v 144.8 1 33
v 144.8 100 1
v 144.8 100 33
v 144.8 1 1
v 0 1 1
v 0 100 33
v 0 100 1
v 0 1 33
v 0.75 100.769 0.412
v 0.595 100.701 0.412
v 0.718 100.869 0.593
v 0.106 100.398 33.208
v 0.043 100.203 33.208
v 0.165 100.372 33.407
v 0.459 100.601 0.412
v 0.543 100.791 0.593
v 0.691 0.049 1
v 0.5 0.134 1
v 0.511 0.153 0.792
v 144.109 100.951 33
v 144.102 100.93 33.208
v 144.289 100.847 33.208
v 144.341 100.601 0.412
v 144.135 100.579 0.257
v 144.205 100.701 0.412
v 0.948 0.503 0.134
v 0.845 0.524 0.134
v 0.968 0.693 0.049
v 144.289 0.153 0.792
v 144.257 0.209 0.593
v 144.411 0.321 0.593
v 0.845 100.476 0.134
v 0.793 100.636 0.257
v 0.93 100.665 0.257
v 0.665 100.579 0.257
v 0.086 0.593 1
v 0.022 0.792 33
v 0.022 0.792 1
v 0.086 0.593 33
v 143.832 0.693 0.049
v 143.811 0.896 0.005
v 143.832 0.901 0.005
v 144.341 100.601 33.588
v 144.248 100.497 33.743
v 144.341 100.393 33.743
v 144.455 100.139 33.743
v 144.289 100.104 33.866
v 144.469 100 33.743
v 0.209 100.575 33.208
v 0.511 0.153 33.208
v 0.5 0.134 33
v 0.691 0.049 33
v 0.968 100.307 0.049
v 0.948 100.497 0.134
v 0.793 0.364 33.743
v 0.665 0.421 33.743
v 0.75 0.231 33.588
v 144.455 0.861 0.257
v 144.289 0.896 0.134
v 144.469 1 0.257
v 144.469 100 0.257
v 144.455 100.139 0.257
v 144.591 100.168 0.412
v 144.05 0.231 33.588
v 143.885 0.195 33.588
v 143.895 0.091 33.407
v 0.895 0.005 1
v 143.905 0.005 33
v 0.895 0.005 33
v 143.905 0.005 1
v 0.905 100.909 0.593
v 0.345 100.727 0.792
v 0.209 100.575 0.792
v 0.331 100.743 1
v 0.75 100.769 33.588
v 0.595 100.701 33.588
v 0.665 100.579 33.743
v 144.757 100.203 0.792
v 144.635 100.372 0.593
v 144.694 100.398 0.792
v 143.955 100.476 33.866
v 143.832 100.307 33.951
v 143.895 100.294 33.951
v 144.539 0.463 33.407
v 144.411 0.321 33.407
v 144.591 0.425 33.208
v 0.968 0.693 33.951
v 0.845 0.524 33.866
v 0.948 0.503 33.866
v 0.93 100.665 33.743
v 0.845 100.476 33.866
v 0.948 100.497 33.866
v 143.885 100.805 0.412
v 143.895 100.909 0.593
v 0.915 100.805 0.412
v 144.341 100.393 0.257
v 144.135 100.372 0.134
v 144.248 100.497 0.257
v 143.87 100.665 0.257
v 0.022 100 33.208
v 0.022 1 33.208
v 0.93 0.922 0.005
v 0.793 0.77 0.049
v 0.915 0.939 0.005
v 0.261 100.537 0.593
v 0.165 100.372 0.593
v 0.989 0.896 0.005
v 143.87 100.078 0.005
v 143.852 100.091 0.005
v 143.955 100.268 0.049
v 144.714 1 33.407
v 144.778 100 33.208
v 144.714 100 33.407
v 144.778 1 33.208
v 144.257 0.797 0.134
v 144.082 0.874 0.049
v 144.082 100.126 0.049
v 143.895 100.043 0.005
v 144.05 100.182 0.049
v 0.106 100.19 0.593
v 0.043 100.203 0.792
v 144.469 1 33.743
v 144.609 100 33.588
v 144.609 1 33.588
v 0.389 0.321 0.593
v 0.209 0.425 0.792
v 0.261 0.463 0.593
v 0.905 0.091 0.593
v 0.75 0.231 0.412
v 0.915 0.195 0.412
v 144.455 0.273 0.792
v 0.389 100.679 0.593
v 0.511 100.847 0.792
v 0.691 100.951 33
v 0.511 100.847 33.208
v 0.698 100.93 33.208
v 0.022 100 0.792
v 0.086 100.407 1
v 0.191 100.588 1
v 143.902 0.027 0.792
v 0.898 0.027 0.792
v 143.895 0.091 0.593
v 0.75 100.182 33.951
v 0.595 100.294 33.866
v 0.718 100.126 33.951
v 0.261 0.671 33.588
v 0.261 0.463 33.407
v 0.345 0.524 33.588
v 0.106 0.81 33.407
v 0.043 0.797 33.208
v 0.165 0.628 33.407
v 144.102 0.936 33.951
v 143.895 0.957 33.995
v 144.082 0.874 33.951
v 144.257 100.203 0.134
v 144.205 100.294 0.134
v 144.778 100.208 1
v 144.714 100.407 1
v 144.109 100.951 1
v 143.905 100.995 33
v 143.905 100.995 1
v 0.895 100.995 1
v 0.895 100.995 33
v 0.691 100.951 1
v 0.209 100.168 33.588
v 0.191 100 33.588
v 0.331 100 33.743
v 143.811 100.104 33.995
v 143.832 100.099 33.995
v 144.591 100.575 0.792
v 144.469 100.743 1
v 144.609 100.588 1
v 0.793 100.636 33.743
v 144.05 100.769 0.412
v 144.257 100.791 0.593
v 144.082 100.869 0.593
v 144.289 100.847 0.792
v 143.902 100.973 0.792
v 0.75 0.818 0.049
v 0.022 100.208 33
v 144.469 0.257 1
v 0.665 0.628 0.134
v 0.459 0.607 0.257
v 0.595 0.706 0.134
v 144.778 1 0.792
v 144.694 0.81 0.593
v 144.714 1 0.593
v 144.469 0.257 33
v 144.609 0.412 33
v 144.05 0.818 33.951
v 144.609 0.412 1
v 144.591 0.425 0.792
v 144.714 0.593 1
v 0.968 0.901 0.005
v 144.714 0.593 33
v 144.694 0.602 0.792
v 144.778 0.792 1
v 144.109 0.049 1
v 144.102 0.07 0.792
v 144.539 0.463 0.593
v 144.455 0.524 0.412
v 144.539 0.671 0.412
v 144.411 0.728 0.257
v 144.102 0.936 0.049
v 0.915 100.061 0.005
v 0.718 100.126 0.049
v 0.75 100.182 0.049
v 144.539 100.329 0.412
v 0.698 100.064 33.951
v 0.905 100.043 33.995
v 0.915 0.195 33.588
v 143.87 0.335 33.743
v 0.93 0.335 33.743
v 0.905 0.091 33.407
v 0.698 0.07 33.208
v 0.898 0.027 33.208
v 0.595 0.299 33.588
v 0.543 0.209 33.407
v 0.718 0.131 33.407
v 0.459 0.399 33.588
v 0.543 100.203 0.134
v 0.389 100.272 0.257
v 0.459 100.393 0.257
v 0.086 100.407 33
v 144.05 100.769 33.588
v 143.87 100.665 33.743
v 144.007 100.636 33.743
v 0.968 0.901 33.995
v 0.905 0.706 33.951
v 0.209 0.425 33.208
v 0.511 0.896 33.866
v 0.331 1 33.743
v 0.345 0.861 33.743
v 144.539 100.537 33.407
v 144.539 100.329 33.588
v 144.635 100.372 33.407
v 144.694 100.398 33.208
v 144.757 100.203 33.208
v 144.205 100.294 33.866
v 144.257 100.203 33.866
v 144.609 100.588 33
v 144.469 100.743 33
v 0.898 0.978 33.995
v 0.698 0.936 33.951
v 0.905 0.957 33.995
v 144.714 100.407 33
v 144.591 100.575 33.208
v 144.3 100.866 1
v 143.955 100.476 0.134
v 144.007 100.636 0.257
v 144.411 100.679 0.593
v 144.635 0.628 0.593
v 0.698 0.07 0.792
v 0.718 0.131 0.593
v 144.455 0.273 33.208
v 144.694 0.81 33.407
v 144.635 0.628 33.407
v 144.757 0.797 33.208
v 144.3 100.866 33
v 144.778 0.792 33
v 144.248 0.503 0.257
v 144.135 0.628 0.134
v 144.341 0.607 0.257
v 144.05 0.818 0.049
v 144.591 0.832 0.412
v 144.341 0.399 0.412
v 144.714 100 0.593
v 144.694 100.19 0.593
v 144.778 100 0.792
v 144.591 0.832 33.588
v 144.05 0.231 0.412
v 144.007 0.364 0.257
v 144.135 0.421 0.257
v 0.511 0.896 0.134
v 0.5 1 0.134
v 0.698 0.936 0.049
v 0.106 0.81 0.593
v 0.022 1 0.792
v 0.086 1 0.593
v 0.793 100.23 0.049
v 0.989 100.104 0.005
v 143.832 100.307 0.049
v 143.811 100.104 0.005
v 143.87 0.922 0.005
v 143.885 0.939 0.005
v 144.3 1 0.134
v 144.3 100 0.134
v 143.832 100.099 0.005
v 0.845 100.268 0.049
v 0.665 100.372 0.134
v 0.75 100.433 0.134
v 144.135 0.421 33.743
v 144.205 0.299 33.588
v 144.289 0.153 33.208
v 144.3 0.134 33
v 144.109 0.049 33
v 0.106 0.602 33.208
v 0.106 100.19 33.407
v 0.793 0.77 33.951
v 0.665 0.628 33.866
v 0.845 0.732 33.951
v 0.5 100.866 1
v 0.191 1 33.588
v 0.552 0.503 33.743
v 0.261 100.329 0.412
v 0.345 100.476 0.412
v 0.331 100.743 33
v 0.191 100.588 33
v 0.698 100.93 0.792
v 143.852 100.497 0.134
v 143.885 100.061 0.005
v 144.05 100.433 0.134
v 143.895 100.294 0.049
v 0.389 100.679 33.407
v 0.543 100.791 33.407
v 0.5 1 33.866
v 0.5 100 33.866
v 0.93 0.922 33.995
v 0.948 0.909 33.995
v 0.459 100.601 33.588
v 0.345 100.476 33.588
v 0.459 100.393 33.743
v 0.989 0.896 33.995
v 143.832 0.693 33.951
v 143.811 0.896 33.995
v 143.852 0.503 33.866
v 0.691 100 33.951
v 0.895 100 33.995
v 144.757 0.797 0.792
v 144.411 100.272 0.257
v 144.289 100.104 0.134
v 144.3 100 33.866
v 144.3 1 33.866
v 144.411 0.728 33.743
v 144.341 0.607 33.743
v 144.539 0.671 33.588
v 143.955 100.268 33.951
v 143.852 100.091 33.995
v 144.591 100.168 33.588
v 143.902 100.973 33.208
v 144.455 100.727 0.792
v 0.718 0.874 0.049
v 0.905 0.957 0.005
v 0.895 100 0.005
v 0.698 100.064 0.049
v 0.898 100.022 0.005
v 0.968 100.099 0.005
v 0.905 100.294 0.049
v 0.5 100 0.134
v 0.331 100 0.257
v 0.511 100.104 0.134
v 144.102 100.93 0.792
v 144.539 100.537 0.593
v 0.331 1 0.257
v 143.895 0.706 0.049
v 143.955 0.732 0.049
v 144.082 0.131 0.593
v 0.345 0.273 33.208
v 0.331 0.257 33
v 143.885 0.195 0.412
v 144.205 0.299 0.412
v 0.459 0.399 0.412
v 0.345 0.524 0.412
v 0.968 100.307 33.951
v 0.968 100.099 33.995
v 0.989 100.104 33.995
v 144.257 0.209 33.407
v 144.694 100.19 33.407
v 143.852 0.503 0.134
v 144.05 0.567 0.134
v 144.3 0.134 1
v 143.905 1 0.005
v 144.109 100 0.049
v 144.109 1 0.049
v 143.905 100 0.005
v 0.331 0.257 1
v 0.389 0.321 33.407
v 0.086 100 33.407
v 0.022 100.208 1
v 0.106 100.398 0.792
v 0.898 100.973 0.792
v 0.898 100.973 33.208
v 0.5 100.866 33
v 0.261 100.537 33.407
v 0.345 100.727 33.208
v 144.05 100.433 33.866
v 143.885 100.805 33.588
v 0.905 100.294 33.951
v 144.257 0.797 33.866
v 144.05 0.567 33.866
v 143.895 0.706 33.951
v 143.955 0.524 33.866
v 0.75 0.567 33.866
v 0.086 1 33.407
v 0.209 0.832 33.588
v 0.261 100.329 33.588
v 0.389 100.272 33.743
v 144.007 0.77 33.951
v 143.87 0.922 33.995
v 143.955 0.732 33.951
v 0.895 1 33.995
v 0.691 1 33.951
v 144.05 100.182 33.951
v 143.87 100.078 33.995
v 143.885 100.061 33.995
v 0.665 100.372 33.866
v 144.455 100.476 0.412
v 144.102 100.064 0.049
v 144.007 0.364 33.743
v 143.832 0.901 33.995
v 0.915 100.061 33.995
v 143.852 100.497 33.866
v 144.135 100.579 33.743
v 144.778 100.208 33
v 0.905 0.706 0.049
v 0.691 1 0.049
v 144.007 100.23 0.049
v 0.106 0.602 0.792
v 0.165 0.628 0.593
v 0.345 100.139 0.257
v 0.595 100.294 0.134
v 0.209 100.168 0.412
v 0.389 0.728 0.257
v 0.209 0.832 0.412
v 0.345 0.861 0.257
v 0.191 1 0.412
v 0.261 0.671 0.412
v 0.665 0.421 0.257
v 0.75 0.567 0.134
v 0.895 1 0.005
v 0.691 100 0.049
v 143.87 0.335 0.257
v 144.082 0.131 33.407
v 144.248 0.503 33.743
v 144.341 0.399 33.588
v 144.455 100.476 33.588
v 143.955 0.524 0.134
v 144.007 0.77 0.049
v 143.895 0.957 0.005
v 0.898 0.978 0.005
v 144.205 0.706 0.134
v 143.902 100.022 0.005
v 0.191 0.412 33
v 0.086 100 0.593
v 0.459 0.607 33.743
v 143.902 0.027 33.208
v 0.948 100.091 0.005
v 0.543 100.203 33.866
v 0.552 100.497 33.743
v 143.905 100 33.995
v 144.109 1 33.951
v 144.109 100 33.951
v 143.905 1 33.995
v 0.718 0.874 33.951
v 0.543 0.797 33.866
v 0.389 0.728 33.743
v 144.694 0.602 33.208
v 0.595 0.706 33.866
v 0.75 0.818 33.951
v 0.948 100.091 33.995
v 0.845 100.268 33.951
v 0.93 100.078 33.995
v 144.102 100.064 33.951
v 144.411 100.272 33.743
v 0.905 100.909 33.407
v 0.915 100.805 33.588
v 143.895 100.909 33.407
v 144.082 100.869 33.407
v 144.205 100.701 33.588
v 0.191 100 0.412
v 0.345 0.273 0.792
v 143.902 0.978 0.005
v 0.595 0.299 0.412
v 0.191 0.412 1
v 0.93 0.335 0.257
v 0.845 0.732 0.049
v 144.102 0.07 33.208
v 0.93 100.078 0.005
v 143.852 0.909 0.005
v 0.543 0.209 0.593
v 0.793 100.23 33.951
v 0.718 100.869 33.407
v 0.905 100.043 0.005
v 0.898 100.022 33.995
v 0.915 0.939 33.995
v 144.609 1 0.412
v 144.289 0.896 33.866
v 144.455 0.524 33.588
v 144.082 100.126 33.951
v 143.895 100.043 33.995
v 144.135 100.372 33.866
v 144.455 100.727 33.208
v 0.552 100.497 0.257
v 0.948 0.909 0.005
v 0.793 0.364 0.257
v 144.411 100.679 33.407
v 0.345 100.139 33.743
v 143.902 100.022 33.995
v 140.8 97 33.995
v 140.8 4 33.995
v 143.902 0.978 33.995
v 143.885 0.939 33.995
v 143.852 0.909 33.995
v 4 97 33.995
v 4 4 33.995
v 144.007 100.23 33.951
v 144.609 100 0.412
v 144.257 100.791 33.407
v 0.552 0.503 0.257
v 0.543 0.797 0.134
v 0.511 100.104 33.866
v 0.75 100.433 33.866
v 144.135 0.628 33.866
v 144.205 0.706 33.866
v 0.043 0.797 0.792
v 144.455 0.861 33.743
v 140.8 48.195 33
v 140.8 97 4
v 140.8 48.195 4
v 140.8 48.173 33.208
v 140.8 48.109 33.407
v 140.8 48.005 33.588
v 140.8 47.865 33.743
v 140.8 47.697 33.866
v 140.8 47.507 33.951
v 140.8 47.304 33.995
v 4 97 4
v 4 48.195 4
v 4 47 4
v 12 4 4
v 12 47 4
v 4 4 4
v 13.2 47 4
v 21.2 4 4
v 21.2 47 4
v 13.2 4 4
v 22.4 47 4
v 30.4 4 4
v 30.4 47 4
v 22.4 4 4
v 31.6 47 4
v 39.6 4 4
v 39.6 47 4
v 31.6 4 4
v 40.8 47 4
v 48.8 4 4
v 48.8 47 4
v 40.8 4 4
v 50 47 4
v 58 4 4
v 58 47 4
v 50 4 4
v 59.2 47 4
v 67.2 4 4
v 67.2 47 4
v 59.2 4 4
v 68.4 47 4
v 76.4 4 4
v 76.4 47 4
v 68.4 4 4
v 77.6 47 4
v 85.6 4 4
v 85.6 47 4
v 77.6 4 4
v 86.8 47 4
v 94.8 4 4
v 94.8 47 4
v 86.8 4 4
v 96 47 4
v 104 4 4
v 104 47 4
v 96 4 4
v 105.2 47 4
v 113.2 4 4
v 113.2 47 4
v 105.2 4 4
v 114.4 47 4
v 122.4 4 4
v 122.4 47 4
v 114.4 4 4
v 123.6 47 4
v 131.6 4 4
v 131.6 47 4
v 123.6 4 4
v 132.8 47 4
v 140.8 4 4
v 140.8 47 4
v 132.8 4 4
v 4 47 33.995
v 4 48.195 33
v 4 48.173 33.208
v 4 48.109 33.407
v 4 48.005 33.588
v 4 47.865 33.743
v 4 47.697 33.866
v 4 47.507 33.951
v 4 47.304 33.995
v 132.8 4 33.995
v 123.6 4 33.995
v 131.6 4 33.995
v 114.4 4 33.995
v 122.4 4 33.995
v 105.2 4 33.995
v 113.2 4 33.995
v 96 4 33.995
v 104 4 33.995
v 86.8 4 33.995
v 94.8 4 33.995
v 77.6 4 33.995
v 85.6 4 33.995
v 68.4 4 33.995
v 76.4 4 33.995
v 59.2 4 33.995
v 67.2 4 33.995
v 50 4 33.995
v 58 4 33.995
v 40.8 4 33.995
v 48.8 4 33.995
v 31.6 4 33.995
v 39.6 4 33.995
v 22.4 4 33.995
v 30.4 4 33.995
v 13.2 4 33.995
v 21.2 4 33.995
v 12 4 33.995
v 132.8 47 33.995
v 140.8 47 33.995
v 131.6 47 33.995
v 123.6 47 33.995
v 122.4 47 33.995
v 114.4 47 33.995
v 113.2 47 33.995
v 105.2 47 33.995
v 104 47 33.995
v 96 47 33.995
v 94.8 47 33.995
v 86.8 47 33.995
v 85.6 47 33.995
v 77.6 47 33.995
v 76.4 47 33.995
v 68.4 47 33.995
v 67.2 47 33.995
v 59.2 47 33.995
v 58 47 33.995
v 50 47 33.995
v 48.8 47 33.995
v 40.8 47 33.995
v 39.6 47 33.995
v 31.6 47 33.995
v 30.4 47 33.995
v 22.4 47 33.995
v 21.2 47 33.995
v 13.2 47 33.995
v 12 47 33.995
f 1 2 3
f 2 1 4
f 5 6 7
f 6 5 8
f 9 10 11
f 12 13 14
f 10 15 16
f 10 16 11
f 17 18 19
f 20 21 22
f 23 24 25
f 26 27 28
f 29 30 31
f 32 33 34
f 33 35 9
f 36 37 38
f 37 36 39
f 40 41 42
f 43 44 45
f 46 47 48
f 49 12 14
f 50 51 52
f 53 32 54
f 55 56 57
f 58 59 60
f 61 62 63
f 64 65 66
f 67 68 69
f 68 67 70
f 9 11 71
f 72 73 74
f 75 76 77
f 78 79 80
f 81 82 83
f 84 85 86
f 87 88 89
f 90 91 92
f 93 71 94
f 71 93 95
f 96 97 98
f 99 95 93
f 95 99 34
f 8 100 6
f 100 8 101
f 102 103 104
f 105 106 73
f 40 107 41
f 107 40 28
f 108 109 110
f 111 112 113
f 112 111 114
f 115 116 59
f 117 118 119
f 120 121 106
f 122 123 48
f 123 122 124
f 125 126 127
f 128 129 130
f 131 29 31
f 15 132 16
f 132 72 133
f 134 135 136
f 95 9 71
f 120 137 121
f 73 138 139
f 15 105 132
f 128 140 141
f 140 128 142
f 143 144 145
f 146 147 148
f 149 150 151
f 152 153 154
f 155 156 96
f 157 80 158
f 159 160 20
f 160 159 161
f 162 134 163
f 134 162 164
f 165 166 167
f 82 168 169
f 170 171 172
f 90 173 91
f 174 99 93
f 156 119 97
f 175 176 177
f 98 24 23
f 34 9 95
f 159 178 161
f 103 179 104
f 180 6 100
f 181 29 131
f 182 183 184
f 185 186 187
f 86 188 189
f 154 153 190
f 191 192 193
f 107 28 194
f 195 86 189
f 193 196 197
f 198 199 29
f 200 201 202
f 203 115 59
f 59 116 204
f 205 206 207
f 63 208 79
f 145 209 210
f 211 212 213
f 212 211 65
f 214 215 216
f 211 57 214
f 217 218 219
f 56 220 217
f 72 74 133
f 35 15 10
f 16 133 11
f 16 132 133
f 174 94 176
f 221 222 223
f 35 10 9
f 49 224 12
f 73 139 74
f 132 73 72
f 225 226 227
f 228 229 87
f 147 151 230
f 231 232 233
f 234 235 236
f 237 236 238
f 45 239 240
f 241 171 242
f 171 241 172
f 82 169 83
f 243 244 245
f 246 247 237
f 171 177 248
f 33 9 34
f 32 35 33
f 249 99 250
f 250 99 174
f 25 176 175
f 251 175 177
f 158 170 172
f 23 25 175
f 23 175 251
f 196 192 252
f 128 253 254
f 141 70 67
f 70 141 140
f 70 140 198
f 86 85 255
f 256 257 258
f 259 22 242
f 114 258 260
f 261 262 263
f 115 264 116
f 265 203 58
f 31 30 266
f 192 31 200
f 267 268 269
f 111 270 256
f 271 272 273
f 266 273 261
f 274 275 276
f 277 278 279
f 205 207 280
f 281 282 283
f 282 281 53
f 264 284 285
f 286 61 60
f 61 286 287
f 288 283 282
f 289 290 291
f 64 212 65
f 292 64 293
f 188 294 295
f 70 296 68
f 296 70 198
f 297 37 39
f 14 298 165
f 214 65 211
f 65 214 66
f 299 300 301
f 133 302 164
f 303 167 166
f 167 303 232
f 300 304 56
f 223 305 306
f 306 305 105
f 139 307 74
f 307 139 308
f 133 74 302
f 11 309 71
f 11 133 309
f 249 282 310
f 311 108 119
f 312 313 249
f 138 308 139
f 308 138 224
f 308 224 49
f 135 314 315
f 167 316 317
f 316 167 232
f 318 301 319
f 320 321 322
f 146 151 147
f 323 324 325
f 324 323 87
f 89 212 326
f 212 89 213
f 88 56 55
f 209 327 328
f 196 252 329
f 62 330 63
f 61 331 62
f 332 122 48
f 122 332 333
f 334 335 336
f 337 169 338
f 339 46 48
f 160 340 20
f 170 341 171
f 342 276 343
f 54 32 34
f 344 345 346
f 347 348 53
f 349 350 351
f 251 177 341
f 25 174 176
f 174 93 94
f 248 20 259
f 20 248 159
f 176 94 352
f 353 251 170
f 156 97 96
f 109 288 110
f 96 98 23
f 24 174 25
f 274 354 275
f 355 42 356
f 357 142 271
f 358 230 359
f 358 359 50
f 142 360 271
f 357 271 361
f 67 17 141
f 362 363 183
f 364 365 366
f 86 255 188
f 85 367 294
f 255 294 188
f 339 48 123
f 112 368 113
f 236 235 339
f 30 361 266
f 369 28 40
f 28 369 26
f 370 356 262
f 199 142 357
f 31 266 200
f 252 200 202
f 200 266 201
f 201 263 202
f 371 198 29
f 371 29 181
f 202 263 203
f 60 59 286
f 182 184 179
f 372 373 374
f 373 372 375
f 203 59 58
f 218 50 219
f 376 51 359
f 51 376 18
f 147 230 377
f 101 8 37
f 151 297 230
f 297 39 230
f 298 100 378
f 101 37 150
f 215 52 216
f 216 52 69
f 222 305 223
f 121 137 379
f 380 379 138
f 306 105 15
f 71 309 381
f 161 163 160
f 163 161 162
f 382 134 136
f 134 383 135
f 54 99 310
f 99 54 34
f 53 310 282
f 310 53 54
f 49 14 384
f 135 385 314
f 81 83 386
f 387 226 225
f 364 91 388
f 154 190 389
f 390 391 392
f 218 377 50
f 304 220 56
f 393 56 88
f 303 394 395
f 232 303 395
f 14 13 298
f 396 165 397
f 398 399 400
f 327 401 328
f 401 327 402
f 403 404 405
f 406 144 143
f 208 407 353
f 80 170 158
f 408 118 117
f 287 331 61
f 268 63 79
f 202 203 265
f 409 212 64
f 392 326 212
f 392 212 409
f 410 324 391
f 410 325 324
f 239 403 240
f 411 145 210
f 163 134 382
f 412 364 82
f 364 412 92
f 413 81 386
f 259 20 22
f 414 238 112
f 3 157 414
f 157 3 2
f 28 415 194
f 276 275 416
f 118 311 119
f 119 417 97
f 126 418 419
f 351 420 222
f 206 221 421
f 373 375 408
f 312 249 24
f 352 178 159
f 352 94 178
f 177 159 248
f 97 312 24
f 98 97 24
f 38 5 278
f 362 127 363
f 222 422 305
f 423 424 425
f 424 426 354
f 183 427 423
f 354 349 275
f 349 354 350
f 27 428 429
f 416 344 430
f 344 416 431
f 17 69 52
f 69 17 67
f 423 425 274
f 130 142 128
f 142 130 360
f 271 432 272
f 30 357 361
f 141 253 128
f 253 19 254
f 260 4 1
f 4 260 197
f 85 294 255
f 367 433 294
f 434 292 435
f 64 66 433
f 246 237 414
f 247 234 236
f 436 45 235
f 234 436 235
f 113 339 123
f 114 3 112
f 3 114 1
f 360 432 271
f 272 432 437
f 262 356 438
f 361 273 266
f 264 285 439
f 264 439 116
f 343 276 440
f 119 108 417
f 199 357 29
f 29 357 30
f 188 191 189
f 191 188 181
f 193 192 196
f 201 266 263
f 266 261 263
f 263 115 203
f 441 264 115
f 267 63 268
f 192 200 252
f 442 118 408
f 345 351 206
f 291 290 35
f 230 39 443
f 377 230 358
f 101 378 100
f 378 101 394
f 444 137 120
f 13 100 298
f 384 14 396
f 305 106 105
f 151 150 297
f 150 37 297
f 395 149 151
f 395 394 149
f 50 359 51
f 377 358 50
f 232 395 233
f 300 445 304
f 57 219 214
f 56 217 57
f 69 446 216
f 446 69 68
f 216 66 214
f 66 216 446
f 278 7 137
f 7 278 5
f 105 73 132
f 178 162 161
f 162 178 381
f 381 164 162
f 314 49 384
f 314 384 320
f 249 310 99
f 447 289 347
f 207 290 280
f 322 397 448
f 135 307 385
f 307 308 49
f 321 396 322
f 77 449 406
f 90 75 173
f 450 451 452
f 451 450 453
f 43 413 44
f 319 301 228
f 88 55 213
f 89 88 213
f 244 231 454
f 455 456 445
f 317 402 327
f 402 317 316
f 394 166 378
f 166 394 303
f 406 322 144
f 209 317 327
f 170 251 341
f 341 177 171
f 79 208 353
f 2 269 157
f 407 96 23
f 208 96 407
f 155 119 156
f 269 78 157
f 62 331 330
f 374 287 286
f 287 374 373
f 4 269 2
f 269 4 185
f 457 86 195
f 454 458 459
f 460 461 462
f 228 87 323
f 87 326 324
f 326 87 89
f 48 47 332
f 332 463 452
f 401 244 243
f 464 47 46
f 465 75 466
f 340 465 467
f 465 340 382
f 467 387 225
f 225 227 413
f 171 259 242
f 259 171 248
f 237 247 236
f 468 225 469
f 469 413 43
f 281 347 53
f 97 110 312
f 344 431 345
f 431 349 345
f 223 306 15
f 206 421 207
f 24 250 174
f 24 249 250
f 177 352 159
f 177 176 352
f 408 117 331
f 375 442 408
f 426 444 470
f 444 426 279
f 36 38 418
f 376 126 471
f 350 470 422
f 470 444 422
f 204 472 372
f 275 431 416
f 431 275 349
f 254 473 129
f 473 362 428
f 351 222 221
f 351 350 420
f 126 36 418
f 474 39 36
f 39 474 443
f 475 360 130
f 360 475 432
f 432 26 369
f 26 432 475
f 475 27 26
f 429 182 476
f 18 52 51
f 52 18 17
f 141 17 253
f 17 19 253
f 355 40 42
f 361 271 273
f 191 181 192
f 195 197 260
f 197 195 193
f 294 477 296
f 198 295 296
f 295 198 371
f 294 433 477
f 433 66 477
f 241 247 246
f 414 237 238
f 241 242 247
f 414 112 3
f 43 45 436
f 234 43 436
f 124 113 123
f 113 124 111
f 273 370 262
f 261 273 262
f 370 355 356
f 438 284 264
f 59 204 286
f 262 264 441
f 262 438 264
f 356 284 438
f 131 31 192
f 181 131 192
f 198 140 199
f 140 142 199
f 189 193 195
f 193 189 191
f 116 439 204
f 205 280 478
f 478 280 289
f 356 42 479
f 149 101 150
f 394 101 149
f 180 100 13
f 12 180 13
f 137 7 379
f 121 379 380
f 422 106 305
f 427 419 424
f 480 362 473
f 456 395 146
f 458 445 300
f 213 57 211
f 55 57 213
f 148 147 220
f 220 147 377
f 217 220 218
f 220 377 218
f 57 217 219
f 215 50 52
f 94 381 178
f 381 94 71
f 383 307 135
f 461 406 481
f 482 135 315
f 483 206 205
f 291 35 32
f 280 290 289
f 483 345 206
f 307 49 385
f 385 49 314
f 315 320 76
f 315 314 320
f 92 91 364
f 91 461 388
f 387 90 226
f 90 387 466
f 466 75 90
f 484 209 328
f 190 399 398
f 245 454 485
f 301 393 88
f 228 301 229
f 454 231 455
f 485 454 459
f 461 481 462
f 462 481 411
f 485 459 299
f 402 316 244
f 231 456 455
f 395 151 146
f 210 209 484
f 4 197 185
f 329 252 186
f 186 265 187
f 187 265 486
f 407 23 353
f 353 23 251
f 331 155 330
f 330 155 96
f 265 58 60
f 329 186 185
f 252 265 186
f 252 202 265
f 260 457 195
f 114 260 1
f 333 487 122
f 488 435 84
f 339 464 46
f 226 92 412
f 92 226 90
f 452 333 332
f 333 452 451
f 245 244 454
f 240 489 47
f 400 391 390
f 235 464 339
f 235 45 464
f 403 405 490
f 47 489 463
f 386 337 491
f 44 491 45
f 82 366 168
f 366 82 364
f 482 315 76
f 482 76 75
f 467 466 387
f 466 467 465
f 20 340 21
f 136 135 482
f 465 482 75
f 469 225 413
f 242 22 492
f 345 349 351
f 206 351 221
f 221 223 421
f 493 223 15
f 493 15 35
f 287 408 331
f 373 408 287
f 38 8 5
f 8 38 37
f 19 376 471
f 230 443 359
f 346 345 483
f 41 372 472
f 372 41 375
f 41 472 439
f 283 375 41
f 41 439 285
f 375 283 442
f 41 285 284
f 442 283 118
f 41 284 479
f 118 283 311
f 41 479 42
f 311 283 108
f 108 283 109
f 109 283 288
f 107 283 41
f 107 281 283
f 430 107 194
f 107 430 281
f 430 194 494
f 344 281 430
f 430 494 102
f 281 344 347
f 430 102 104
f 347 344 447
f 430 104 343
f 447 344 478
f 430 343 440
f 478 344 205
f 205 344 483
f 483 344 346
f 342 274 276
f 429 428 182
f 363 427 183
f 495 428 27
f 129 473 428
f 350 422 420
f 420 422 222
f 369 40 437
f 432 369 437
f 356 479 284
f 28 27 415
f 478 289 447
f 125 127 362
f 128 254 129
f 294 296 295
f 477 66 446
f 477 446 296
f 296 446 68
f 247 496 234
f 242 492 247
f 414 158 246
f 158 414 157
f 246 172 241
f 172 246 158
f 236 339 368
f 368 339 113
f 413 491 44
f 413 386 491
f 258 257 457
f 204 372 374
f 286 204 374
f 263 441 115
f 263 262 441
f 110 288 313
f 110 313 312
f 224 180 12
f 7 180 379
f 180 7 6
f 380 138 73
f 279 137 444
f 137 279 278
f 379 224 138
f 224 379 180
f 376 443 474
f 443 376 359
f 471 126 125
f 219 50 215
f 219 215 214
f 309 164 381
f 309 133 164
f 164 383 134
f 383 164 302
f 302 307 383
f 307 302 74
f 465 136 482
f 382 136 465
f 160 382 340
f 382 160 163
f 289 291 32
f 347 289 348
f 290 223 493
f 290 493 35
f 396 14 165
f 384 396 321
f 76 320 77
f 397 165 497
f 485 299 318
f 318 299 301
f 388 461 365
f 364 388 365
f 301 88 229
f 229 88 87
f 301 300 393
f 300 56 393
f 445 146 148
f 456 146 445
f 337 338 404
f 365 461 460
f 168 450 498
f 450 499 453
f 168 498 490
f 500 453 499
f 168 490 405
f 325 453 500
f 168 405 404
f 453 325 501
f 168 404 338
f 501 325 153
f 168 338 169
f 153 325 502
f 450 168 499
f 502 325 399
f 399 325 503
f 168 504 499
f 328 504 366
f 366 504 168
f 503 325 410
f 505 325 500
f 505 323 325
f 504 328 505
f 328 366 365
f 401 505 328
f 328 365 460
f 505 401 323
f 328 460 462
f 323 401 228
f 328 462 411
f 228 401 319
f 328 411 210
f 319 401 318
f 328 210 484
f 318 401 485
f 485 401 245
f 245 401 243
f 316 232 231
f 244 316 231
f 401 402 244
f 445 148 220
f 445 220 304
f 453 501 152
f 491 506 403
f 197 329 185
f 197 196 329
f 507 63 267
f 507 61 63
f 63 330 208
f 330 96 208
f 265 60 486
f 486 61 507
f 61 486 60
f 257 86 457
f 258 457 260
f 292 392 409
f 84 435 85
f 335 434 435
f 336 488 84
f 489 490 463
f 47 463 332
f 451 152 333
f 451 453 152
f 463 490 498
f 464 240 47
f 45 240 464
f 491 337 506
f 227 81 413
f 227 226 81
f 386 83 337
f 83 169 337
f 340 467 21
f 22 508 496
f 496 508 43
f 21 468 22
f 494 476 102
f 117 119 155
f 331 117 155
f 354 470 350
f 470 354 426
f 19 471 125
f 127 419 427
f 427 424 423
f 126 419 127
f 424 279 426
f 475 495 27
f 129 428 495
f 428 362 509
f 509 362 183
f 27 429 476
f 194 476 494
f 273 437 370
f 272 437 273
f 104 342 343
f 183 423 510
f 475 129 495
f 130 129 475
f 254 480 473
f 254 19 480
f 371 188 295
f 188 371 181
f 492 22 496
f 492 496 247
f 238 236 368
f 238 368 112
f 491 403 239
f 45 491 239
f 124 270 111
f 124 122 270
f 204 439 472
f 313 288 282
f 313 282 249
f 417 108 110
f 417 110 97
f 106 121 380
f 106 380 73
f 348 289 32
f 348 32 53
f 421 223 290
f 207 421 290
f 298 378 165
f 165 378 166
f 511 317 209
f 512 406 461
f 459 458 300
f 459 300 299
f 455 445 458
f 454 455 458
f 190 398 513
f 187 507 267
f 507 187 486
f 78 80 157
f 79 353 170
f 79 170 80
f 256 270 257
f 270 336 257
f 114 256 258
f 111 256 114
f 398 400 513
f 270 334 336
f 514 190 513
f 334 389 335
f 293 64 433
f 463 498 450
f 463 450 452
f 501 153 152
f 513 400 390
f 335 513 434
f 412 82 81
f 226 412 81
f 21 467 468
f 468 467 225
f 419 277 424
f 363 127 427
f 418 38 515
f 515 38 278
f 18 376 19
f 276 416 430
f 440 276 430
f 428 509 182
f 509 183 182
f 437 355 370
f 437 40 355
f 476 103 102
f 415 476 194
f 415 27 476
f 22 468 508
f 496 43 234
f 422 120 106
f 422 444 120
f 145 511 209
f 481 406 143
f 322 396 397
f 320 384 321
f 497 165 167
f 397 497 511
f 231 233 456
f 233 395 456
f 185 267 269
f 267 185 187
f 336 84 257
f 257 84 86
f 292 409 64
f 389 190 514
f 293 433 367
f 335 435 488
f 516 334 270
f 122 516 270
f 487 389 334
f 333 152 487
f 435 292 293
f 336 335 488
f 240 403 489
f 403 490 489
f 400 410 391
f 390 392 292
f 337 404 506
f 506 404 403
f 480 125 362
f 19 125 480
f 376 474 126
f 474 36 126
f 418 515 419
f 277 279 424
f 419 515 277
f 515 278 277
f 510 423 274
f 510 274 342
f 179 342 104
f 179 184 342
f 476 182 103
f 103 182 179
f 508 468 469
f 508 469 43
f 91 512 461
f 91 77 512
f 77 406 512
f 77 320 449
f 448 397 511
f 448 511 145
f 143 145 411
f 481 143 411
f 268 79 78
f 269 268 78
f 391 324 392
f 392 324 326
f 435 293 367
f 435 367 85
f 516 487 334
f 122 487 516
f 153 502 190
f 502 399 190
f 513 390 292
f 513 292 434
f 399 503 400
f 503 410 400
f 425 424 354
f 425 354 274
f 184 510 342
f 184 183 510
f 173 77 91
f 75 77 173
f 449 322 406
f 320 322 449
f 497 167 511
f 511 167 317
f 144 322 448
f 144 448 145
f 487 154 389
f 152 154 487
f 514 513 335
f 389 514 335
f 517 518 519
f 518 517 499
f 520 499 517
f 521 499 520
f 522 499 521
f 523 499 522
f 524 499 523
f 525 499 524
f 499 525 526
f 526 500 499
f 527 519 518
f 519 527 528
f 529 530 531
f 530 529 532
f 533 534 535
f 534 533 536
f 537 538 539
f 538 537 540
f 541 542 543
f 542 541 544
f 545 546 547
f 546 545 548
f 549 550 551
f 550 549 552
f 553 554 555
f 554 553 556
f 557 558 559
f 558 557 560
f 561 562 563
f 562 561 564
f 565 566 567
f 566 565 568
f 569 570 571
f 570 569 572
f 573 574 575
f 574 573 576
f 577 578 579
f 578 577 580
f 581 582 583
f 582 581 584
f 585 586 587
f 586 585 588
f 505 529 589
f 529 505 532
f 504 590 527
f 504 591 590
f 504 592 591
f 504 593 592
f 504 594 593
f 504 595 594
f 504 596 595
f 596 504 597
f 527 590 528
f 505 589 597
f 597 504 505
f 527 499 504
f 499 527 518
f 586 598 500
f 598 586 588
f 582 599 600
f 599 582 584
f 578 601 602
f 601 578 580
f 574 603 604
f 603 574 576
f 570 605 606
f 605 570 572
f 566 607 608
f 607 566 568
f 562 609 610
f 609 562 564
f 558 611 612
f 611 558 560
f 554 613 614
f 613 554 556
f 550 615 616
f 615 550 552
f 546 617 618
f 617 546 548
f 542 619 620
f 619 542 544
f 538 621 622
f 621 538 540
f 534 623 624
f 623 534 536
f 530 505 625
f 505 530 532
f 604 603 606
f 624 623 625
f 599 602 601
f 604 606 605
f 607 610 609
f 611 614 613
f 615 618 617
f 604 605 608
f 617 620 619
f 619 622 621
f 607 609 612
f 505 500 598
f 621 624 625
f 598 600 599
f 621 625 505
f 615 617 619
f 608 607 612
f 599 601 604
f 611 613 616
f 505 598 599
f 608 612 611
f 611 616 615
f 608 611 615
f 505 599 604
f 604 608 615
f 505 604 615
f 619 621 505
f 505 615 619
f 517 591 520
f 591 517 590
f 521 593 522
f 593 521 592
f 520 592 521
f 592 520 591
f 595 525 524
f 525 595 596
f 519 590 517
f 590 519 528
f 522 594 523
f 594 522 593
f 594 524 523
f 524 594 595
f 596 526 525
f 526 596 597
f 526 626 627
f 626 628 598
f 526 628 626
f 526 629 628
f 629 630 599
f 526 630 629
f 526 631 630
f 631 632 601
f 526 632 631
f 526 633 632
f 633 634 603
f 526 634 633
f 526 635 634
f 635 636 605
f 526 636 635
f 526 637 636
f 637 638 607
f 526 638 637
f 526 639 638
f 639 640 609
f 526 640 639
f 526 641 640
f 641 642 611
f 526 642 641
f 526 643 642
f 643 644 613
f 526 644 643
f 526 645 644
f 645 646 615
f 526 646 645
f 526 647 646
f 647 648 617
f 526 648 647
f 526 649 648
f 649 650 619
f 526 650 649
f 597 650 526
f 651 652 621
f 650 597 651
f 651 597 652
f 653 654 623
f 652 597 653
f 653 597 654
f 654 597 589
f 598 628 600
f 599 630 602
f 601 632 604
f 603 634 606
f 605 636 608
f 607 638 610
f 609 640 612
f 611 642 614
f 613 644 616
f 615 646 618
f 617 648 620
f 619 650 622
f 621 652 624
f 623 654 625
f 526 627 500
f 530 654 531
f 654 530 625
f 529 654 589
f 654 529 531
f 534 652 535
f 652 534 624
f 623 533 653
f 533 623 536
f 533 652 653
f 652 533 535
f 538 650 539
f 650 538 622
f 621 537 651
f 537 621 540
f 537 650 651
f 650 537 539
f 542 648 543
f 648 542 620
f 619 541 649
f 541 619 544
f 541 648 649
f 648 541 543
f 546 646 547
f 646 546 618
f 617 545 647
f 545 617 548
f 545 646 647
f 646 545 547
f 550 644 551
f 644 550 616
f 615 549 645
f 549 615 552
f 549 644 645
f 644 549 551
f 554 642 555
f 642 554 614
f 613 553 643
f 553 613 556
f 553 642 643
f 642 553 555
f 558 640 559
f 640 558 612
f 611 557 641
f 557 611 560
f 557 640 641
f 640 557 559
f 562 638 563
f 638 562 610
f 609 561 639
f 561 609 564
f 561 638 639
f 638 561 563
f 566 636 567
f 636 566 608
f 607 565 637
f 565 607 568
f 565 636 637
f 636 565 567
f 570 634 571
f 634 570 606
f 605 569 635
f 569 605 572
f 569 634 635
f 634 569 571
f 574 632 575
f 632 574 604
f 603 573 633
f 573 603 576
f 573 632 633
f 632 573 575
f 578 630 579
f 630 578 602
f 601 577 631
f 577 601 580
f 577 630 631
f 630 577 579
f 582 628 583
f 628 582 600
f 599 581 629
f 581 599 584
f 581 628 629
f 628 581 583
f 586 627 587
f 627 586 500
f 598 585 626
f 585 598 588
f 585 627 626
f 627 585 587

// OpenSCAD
// Download both files into the same directory and make a copy of this template for each project. Adjust the variables and values as needed to override the defaults in this file as needed. In this way you can replace the `Ultimate_Box_Generator.scad` file with a new version without having to track and restore your changes.

// If you want to use any framework variables in calulations you must import them here. If you want to also change the variable you must use a second line below to do that.
wall=wall;
internal_wall=internal_wall;

sdcase_x = 8;
sdcase_y = 43;
sdcase_qty_x = 15;
sdcase_qty_y = 1;
extra_x = 0;
extra_y = 50;

// Include the framework. You can change the prefix to load from a shared path.
include    <Ultimate_Box_Generator.scad>;

// At this point you can start to adjust builtin varaibles and create your own. There are also some examples of more complex boxes at the end of the file.


// Parts to render. To do more complex opperations disable these and manually call make_box() and make_lid() instead.
show_box=true;	// Whether or not to render the box
show_lid=false;	// Whether or not to render the lid. To make open boxes with no lid set `show_lid=false` and `lid_type=5`.

lid_type=0; // Lid type, see above.
internal_wall=1.2;

comp_size_x = (sdcase_x+internal_wall)*sdcase_qty_x-internal_wall+extra_x;
comp_size_y = (sdcase_y+internal_wall)*sdcase_qty_y-internal_wall+extra_y;
comp_size_deep = 30;
//internal_wall_deep = comp_size_deep-15;
box_corner_radius=1;
wall= 4;
comp1=make_object(x=sdcase_x, y=sdcase_y, z=comp_size_deep, offset_x=0, offset_y=0, repeat_x=sdcase_qty_x, repeat_y=sdcase_qty_y);
complex_box=[comp1];
make_complex_box=true;




// General Settings
//comp_size_deep = 12; // Depth of compartments
//comp_size_x = 50;	 // Size of compartments, X
//comp_size_y = 35;	 // Size of compartments, Y
//wall = 2.5;		    // Width of wall, see `internal_wall` below for alternate inner wall size.
//repeat_x = 1;		// Number of compartments, X
//repeat_y = 1;		// Number of compartments, Y
//tolerance=.15;      // Tolerance around lid.  If it's too tight, increase this. If it's too loose, decrease it.

// Box Rounding
//box_corner_radius=0; // Add a rounding affect to the corners of the box. Anything over `wall` will cause structure and lid problems.
//internal_corner_radius=0; // Add a rounding affect to the inside.
//mesh_corner_radius=0; // Leave a radius around each corner of the mesh. May hep with bridges.
//corner_fn=30;

// Supress individual walls.
//supress_walls_x=[]; // These are the walls running along the X axis. It should be an array of size [repeat_y-1][repeat_x].
//supress_walls_y=[]; // These are the walls running along the Y axis. It should be an array of size [repeat_x-1][repeat_y].
// Example for repeat_x=4, repeat_y=3:
//supress_walls_x=[[1,0,1,1],[0,1,0,1]];
//supress_walls_y=[[1,0,1],[0,1,1],[1,1,1]];
//supress_sides=false; // [X, Y, X, Y] Cutout/supress some sides. this may behave baddly with compartments or mesh.
//supress_sides_radius=wall; // Add a rounding to the cutout.
//supress_sides_offset=0; // 0, wall, [X, Y, Z] adjsut the coutout in all directions. + to grow, - so shrink
//supress_sides_fn=30;

// Mesh Settings
// To make rounded corners and no mesh use any `mesh_type` > 0 and set `strut_gap` to a high value.
// 0: No mesh, solid wall.
// 1: Single direction mesh.
// 2: Two direction cross mesh and 90 degree angle to eachother.
// 3: Two direction mesh but mirrored around 90 axsis instead or rotated 90 degrees.
// 4: Calculate angle across the diagonal of each opening. You will also want to change `strut_gap` to a large number and set `strut_count_min=1`.
// 5: No mesh, empty wall.
// 6: Honycomb. Also set `strut_width=wall/4` and `strut_gap=wall*2`. To big of a `strut_gap` may fail to print. Other shapes can be generated with `mesh_fn` and reducing `mesh_inset_padding` may help.
//mesh_type=0; // Mesh type, see above.
//mesh_rotation=0; // 0-90 degrees.
//mesh_alt_rotation=mesh_rotation; // Alternate rotation for top and bottom faces.
//mesh_do_sides=true; //[true, true, true, false] Include mesh on each side along axis. [X, Y, X, Y]
//mesh_do_bottom=false; // Include mesh on bottom plate.
//mesh_do_top=true; // Include mesh on top piece.
//mesh_do_interior=false; // Include mesh on inner walls.
//mesh_inset_padding=wall; // Leave some solid material before building strut frame. Anything less then wall/2 will likely fall apart.
//mesh_fn=mesh_type == 6 ? 6 : 40; // Complexity of curves in mesh's, increese for smoother curves.
//strut_width=wall*2; // Width of each strut, 0=hollow.
//strut_gap=wall; // Width of the air gap between each strut. 0=fine air gaps.
//strut_count_min=0; // Optinal minimum number of struts regardless of size calulations.
//alt_strut_width=strut_width; // Width of struts going the other directions.
//alt_strut_gap=strut_gap; // Width of gap going the other direction.
//alt_strut_count_min=strut_count_min; // Optinal minimum number of struts regardless of size calulations.
//mesh_overflow=0; // Extra rows to add to the mesh. For example in the Honeycomb partial hexegons will be created along the edges.

// Lid Settings
// 0: No Lid. top may be rounded and can cause other rendering changes.
// 1: Lid that slides off in the x direction.
// 2: Lid with a snapped in hinge that rotates open
// 3: Lid that snaps down onto the box. Also need to change lid_height to around 1.5mm.
// 4: Stackable version of cover 1 there boxes slide into one another. You will need one cover for the last box. (Not tested)
// 5: Oversized lid sits on top and has sides that extend down. (Needs snapp support)
//lid_type=1; // Lid type, see above.
//has_thumbhole=true; // Add gripping locations for easy opening.
//has_coinslot=false; // Add slot in the top for dropping in components.
//has_snap=true; // Add small ridges or snaps to lids to help keep them closed.
//coinslot_x=20;	// Size in X direction
//coinslot_y=2.5;	// Size in Y direction
//coinslot_corner_radius=0; // rounded coinslot corners if >0; best if less than half the shorter coinslot dimension
//z_tolerance=0;   // Z tolerance can be tweaked separately, to make the top of the sliding lid be flush with the top of the box itself.
//extra_bottom=.15; // Extra bottm wall height to fit type 4 slider.
//hinge_inset=.75; // Size of the hinge connection.
//snap_inset=.25; // Amount of overhang for snaps to snap into place.
//snap_tolerance=tolerance; // You may need to add tolerance around lid and snaps to let them move freely.
//lid_offset=3;		// This is how far away from the box to print the lid
//lid_height=wall*2;  // Height of lid. Must be greater than wall width for a `lid_type=5` lid to work. On Lid 3 is the depth of the inset snap.
//lid_fn=40; // Increese if printing thicker walls.
//lid_alt_offset=false; // Move lid in X instead of Y for printing.

//Internal Structure (You may need to turn off `mesh_do_sides` or `mesh_do_bottom` for good results.)
// You can also use `make_wall()` to manually add your own walls.
// 1: Rounded bottom frame.
// 2: Hexegon bottom frame. (To make this shape perfect set `comp_size_deep` to the width between to edges of the tile and set `comp_size_x` or `comp_size_y` to this this: `comp_size_deep / sqrt(3)*2`.
// 3: Rough bottom for make bits sit unevenly. (Partial)
// 4: Verical rounding on cordner. Set `internal_size_deep` to `comp_size_deep` and `internal_size_circle` to the shortest `comp_size` for a circle.
// 5: Vertical hexegon. Retulst may varry.
//internal_type=0; // Internal structure, see above.
//internal_rotate=false; // On lid axis or rotate to opposite.
//internal_size_deep=comp_size_deep/2; // How far into the box to start the internal structure. Should be `comp_size_deep/2` for type 1-2, `wall` for 3, or comp_size_deep for type 4-5.
//internal_size_circle=internal_type==1 ? internal_size_deep : internal_size_deep * 2 / sqrt(3); // Use this calculation, or the shorter comp_size for type 4-5.
//internal_fn=internal_type==1 || internal_type==4 ? 60 : 6; // Complexity of internal curves, may need to increase for larger or smoother curves.
//internal_wall=wall; // Custom size for internal walls.

// Text Settings
// 0: None.
// 1: Cutout. Remove material formt he wall.
// 2: Raised. If a mesh is ued part of it is filled in to hold the text. Lids 0 and 3 are printed upside down by default. With this option used they will require supports regardless of the orrientation printed.
//text_type=0; // Text type, see above.
//text_depth=wall/6; // Distance to cutout text or raise it. User `wall` to cut through.
//text_size=5; // Font Size.
//text_font="Courier New:style=Bold"; // Use Hepl -> Font List to see options.
//text_message="Red Player"; // Message Text, or use `["Line 1", "Line 2"]` for multiline.
//text_message_compartments=false;//[["AA", "BB", "CC"], ["AB", "BC", "CD"]]; // Custom text for compartments in top or bottom. Also support multiline as `[[ ["A", "B"] ]]`.
//text_sides=true;//[true, true, true, false]; // Sides to put text on, [X, Y, X, Y]
//text_top=true; // Put Text on the top.
//text_bottom=false; // Put Text on the bottom.
//text_rotation=0; // Rotate the top and bottom text by X degrees. 90 will rotate from the X axis to the Y axis.
//text_offset=0; // Text is verticaly centered in the wall. This may look "off" due to casing or hanging tails. You can manually adjust the vertical alignment with this setting.
//text_fn=30; // Complexity of the letters, may need to increese with larger fonts.
//text_backdrop_scale=[.9, 1.5]; // Font size scaleing used on the backdrop when `text_type=2` is used on sides with a mesh.

// Complex Structure
//make_complex_box=false; // Use an array of objects from `complex_box` to create many smaller boxes within the larger box.
//internal_grow_down=true; // If set compartments will be extruded into the larger box from the top to make a flush surface. (May make a model that uses a lot of material.
//internal_empty_bottom=false; // If set the area blow each box will be empty. This will not be printable on a FDM printer unless supports are included internally but still may save material and print time.



// In addition you can set `show_box=false;` and then call `make_box()` manually to join and remove more structure to it like in this example.
/*show_box=false;
difference() {
    make_box();
    translate([0, comp_size_y/2 + wall, 0])
    rotate([0, 90, 0])
    cylinder(comp_size_x +wall*2, 10, 10);
}*/

// You can also use calls to `make_internal_box` to create more complex boxes within a larger box that share a single lid.
/*show_box=false;
make_box();
intersection() {     
    faction_x=10; faction_y=comp_size_y; faction_z=5; faction_repeat_x=3; faction_repeat_y=1;
    faction_size_x=calc_size(faction_repeat_x, faction_x, wall=internal_wall, internal_wall=internal_wall);
faction_size_y=calc_size(faction_repeat_y, faction_y, wall=internal_wall, internal_wall=internal_wall);
    
    translate([wall, wall, wall])
    cube([faction_size_x - wall, faction_size_y - wall*2, comp_size_deep]);
            
    translate([wall-internal_wall, wall-internal_wall, wall-internal_wall])
    union() {
        translate([0, 0, 0])
        make_internal_box(faction_x, faction_y, faction_z, wall=internal_wall, repeat_x=faction_repeat_x, repeat_y=faction_repeat_y);
    }
}*/

// This exmaple wil make a complex series of boxes in a larger container. The object's can be used to position other oebjects and create internal structure.
/*comp_size_x = 200;
comp_size_y = 200;
comp_size_deep = 200;

internal_wall=wall/2;

comp1=make_object(x=10, y=30, z=45, offset_x=0, offset_y=0, repeat_x=3, repeat_y=1, color="Red");
comp2=make_object(x=35, y=40, z=45, offset_x=comp1[4][0], offset_y=0, repeat_x=1, repeat_y=1, color="Pink");
comp3=make_object(x=35, y=30, z=45, offset_x=comp2[4][0], offset_y=0, repeat_x=1, repeat_y=1, color="Orange");
comp4=make_object(x=150, y=100, z=75, offset_x=0, offset_y=comp1[4][1], repeat_x=1, repeat_y=1, color="Blue");

complex_box=[
    comp1, comp2, comp3, comp4,
    
];
make_complex_box=true;*/


// Some notes on complex prints:
/* OpenSCAD expereicne is required to do pretty much any type of customization or complex opperations. This will essentaily jsut make the containers within one larger object with a single lid. Alternatly multiple boxes could be reated and then joined together with translations to make a larger object with multiple lids. 
   Due to how variables are passed in OpenSCAD it can be tricky to get the parameters set on the parent box and child boxes as you want. It is best to use global variable assignmets to set the child box parameters, then pass overrides to the `make_box()` call yourself. (You have to also set `show_box=false;` if you ddo this.)
  */
